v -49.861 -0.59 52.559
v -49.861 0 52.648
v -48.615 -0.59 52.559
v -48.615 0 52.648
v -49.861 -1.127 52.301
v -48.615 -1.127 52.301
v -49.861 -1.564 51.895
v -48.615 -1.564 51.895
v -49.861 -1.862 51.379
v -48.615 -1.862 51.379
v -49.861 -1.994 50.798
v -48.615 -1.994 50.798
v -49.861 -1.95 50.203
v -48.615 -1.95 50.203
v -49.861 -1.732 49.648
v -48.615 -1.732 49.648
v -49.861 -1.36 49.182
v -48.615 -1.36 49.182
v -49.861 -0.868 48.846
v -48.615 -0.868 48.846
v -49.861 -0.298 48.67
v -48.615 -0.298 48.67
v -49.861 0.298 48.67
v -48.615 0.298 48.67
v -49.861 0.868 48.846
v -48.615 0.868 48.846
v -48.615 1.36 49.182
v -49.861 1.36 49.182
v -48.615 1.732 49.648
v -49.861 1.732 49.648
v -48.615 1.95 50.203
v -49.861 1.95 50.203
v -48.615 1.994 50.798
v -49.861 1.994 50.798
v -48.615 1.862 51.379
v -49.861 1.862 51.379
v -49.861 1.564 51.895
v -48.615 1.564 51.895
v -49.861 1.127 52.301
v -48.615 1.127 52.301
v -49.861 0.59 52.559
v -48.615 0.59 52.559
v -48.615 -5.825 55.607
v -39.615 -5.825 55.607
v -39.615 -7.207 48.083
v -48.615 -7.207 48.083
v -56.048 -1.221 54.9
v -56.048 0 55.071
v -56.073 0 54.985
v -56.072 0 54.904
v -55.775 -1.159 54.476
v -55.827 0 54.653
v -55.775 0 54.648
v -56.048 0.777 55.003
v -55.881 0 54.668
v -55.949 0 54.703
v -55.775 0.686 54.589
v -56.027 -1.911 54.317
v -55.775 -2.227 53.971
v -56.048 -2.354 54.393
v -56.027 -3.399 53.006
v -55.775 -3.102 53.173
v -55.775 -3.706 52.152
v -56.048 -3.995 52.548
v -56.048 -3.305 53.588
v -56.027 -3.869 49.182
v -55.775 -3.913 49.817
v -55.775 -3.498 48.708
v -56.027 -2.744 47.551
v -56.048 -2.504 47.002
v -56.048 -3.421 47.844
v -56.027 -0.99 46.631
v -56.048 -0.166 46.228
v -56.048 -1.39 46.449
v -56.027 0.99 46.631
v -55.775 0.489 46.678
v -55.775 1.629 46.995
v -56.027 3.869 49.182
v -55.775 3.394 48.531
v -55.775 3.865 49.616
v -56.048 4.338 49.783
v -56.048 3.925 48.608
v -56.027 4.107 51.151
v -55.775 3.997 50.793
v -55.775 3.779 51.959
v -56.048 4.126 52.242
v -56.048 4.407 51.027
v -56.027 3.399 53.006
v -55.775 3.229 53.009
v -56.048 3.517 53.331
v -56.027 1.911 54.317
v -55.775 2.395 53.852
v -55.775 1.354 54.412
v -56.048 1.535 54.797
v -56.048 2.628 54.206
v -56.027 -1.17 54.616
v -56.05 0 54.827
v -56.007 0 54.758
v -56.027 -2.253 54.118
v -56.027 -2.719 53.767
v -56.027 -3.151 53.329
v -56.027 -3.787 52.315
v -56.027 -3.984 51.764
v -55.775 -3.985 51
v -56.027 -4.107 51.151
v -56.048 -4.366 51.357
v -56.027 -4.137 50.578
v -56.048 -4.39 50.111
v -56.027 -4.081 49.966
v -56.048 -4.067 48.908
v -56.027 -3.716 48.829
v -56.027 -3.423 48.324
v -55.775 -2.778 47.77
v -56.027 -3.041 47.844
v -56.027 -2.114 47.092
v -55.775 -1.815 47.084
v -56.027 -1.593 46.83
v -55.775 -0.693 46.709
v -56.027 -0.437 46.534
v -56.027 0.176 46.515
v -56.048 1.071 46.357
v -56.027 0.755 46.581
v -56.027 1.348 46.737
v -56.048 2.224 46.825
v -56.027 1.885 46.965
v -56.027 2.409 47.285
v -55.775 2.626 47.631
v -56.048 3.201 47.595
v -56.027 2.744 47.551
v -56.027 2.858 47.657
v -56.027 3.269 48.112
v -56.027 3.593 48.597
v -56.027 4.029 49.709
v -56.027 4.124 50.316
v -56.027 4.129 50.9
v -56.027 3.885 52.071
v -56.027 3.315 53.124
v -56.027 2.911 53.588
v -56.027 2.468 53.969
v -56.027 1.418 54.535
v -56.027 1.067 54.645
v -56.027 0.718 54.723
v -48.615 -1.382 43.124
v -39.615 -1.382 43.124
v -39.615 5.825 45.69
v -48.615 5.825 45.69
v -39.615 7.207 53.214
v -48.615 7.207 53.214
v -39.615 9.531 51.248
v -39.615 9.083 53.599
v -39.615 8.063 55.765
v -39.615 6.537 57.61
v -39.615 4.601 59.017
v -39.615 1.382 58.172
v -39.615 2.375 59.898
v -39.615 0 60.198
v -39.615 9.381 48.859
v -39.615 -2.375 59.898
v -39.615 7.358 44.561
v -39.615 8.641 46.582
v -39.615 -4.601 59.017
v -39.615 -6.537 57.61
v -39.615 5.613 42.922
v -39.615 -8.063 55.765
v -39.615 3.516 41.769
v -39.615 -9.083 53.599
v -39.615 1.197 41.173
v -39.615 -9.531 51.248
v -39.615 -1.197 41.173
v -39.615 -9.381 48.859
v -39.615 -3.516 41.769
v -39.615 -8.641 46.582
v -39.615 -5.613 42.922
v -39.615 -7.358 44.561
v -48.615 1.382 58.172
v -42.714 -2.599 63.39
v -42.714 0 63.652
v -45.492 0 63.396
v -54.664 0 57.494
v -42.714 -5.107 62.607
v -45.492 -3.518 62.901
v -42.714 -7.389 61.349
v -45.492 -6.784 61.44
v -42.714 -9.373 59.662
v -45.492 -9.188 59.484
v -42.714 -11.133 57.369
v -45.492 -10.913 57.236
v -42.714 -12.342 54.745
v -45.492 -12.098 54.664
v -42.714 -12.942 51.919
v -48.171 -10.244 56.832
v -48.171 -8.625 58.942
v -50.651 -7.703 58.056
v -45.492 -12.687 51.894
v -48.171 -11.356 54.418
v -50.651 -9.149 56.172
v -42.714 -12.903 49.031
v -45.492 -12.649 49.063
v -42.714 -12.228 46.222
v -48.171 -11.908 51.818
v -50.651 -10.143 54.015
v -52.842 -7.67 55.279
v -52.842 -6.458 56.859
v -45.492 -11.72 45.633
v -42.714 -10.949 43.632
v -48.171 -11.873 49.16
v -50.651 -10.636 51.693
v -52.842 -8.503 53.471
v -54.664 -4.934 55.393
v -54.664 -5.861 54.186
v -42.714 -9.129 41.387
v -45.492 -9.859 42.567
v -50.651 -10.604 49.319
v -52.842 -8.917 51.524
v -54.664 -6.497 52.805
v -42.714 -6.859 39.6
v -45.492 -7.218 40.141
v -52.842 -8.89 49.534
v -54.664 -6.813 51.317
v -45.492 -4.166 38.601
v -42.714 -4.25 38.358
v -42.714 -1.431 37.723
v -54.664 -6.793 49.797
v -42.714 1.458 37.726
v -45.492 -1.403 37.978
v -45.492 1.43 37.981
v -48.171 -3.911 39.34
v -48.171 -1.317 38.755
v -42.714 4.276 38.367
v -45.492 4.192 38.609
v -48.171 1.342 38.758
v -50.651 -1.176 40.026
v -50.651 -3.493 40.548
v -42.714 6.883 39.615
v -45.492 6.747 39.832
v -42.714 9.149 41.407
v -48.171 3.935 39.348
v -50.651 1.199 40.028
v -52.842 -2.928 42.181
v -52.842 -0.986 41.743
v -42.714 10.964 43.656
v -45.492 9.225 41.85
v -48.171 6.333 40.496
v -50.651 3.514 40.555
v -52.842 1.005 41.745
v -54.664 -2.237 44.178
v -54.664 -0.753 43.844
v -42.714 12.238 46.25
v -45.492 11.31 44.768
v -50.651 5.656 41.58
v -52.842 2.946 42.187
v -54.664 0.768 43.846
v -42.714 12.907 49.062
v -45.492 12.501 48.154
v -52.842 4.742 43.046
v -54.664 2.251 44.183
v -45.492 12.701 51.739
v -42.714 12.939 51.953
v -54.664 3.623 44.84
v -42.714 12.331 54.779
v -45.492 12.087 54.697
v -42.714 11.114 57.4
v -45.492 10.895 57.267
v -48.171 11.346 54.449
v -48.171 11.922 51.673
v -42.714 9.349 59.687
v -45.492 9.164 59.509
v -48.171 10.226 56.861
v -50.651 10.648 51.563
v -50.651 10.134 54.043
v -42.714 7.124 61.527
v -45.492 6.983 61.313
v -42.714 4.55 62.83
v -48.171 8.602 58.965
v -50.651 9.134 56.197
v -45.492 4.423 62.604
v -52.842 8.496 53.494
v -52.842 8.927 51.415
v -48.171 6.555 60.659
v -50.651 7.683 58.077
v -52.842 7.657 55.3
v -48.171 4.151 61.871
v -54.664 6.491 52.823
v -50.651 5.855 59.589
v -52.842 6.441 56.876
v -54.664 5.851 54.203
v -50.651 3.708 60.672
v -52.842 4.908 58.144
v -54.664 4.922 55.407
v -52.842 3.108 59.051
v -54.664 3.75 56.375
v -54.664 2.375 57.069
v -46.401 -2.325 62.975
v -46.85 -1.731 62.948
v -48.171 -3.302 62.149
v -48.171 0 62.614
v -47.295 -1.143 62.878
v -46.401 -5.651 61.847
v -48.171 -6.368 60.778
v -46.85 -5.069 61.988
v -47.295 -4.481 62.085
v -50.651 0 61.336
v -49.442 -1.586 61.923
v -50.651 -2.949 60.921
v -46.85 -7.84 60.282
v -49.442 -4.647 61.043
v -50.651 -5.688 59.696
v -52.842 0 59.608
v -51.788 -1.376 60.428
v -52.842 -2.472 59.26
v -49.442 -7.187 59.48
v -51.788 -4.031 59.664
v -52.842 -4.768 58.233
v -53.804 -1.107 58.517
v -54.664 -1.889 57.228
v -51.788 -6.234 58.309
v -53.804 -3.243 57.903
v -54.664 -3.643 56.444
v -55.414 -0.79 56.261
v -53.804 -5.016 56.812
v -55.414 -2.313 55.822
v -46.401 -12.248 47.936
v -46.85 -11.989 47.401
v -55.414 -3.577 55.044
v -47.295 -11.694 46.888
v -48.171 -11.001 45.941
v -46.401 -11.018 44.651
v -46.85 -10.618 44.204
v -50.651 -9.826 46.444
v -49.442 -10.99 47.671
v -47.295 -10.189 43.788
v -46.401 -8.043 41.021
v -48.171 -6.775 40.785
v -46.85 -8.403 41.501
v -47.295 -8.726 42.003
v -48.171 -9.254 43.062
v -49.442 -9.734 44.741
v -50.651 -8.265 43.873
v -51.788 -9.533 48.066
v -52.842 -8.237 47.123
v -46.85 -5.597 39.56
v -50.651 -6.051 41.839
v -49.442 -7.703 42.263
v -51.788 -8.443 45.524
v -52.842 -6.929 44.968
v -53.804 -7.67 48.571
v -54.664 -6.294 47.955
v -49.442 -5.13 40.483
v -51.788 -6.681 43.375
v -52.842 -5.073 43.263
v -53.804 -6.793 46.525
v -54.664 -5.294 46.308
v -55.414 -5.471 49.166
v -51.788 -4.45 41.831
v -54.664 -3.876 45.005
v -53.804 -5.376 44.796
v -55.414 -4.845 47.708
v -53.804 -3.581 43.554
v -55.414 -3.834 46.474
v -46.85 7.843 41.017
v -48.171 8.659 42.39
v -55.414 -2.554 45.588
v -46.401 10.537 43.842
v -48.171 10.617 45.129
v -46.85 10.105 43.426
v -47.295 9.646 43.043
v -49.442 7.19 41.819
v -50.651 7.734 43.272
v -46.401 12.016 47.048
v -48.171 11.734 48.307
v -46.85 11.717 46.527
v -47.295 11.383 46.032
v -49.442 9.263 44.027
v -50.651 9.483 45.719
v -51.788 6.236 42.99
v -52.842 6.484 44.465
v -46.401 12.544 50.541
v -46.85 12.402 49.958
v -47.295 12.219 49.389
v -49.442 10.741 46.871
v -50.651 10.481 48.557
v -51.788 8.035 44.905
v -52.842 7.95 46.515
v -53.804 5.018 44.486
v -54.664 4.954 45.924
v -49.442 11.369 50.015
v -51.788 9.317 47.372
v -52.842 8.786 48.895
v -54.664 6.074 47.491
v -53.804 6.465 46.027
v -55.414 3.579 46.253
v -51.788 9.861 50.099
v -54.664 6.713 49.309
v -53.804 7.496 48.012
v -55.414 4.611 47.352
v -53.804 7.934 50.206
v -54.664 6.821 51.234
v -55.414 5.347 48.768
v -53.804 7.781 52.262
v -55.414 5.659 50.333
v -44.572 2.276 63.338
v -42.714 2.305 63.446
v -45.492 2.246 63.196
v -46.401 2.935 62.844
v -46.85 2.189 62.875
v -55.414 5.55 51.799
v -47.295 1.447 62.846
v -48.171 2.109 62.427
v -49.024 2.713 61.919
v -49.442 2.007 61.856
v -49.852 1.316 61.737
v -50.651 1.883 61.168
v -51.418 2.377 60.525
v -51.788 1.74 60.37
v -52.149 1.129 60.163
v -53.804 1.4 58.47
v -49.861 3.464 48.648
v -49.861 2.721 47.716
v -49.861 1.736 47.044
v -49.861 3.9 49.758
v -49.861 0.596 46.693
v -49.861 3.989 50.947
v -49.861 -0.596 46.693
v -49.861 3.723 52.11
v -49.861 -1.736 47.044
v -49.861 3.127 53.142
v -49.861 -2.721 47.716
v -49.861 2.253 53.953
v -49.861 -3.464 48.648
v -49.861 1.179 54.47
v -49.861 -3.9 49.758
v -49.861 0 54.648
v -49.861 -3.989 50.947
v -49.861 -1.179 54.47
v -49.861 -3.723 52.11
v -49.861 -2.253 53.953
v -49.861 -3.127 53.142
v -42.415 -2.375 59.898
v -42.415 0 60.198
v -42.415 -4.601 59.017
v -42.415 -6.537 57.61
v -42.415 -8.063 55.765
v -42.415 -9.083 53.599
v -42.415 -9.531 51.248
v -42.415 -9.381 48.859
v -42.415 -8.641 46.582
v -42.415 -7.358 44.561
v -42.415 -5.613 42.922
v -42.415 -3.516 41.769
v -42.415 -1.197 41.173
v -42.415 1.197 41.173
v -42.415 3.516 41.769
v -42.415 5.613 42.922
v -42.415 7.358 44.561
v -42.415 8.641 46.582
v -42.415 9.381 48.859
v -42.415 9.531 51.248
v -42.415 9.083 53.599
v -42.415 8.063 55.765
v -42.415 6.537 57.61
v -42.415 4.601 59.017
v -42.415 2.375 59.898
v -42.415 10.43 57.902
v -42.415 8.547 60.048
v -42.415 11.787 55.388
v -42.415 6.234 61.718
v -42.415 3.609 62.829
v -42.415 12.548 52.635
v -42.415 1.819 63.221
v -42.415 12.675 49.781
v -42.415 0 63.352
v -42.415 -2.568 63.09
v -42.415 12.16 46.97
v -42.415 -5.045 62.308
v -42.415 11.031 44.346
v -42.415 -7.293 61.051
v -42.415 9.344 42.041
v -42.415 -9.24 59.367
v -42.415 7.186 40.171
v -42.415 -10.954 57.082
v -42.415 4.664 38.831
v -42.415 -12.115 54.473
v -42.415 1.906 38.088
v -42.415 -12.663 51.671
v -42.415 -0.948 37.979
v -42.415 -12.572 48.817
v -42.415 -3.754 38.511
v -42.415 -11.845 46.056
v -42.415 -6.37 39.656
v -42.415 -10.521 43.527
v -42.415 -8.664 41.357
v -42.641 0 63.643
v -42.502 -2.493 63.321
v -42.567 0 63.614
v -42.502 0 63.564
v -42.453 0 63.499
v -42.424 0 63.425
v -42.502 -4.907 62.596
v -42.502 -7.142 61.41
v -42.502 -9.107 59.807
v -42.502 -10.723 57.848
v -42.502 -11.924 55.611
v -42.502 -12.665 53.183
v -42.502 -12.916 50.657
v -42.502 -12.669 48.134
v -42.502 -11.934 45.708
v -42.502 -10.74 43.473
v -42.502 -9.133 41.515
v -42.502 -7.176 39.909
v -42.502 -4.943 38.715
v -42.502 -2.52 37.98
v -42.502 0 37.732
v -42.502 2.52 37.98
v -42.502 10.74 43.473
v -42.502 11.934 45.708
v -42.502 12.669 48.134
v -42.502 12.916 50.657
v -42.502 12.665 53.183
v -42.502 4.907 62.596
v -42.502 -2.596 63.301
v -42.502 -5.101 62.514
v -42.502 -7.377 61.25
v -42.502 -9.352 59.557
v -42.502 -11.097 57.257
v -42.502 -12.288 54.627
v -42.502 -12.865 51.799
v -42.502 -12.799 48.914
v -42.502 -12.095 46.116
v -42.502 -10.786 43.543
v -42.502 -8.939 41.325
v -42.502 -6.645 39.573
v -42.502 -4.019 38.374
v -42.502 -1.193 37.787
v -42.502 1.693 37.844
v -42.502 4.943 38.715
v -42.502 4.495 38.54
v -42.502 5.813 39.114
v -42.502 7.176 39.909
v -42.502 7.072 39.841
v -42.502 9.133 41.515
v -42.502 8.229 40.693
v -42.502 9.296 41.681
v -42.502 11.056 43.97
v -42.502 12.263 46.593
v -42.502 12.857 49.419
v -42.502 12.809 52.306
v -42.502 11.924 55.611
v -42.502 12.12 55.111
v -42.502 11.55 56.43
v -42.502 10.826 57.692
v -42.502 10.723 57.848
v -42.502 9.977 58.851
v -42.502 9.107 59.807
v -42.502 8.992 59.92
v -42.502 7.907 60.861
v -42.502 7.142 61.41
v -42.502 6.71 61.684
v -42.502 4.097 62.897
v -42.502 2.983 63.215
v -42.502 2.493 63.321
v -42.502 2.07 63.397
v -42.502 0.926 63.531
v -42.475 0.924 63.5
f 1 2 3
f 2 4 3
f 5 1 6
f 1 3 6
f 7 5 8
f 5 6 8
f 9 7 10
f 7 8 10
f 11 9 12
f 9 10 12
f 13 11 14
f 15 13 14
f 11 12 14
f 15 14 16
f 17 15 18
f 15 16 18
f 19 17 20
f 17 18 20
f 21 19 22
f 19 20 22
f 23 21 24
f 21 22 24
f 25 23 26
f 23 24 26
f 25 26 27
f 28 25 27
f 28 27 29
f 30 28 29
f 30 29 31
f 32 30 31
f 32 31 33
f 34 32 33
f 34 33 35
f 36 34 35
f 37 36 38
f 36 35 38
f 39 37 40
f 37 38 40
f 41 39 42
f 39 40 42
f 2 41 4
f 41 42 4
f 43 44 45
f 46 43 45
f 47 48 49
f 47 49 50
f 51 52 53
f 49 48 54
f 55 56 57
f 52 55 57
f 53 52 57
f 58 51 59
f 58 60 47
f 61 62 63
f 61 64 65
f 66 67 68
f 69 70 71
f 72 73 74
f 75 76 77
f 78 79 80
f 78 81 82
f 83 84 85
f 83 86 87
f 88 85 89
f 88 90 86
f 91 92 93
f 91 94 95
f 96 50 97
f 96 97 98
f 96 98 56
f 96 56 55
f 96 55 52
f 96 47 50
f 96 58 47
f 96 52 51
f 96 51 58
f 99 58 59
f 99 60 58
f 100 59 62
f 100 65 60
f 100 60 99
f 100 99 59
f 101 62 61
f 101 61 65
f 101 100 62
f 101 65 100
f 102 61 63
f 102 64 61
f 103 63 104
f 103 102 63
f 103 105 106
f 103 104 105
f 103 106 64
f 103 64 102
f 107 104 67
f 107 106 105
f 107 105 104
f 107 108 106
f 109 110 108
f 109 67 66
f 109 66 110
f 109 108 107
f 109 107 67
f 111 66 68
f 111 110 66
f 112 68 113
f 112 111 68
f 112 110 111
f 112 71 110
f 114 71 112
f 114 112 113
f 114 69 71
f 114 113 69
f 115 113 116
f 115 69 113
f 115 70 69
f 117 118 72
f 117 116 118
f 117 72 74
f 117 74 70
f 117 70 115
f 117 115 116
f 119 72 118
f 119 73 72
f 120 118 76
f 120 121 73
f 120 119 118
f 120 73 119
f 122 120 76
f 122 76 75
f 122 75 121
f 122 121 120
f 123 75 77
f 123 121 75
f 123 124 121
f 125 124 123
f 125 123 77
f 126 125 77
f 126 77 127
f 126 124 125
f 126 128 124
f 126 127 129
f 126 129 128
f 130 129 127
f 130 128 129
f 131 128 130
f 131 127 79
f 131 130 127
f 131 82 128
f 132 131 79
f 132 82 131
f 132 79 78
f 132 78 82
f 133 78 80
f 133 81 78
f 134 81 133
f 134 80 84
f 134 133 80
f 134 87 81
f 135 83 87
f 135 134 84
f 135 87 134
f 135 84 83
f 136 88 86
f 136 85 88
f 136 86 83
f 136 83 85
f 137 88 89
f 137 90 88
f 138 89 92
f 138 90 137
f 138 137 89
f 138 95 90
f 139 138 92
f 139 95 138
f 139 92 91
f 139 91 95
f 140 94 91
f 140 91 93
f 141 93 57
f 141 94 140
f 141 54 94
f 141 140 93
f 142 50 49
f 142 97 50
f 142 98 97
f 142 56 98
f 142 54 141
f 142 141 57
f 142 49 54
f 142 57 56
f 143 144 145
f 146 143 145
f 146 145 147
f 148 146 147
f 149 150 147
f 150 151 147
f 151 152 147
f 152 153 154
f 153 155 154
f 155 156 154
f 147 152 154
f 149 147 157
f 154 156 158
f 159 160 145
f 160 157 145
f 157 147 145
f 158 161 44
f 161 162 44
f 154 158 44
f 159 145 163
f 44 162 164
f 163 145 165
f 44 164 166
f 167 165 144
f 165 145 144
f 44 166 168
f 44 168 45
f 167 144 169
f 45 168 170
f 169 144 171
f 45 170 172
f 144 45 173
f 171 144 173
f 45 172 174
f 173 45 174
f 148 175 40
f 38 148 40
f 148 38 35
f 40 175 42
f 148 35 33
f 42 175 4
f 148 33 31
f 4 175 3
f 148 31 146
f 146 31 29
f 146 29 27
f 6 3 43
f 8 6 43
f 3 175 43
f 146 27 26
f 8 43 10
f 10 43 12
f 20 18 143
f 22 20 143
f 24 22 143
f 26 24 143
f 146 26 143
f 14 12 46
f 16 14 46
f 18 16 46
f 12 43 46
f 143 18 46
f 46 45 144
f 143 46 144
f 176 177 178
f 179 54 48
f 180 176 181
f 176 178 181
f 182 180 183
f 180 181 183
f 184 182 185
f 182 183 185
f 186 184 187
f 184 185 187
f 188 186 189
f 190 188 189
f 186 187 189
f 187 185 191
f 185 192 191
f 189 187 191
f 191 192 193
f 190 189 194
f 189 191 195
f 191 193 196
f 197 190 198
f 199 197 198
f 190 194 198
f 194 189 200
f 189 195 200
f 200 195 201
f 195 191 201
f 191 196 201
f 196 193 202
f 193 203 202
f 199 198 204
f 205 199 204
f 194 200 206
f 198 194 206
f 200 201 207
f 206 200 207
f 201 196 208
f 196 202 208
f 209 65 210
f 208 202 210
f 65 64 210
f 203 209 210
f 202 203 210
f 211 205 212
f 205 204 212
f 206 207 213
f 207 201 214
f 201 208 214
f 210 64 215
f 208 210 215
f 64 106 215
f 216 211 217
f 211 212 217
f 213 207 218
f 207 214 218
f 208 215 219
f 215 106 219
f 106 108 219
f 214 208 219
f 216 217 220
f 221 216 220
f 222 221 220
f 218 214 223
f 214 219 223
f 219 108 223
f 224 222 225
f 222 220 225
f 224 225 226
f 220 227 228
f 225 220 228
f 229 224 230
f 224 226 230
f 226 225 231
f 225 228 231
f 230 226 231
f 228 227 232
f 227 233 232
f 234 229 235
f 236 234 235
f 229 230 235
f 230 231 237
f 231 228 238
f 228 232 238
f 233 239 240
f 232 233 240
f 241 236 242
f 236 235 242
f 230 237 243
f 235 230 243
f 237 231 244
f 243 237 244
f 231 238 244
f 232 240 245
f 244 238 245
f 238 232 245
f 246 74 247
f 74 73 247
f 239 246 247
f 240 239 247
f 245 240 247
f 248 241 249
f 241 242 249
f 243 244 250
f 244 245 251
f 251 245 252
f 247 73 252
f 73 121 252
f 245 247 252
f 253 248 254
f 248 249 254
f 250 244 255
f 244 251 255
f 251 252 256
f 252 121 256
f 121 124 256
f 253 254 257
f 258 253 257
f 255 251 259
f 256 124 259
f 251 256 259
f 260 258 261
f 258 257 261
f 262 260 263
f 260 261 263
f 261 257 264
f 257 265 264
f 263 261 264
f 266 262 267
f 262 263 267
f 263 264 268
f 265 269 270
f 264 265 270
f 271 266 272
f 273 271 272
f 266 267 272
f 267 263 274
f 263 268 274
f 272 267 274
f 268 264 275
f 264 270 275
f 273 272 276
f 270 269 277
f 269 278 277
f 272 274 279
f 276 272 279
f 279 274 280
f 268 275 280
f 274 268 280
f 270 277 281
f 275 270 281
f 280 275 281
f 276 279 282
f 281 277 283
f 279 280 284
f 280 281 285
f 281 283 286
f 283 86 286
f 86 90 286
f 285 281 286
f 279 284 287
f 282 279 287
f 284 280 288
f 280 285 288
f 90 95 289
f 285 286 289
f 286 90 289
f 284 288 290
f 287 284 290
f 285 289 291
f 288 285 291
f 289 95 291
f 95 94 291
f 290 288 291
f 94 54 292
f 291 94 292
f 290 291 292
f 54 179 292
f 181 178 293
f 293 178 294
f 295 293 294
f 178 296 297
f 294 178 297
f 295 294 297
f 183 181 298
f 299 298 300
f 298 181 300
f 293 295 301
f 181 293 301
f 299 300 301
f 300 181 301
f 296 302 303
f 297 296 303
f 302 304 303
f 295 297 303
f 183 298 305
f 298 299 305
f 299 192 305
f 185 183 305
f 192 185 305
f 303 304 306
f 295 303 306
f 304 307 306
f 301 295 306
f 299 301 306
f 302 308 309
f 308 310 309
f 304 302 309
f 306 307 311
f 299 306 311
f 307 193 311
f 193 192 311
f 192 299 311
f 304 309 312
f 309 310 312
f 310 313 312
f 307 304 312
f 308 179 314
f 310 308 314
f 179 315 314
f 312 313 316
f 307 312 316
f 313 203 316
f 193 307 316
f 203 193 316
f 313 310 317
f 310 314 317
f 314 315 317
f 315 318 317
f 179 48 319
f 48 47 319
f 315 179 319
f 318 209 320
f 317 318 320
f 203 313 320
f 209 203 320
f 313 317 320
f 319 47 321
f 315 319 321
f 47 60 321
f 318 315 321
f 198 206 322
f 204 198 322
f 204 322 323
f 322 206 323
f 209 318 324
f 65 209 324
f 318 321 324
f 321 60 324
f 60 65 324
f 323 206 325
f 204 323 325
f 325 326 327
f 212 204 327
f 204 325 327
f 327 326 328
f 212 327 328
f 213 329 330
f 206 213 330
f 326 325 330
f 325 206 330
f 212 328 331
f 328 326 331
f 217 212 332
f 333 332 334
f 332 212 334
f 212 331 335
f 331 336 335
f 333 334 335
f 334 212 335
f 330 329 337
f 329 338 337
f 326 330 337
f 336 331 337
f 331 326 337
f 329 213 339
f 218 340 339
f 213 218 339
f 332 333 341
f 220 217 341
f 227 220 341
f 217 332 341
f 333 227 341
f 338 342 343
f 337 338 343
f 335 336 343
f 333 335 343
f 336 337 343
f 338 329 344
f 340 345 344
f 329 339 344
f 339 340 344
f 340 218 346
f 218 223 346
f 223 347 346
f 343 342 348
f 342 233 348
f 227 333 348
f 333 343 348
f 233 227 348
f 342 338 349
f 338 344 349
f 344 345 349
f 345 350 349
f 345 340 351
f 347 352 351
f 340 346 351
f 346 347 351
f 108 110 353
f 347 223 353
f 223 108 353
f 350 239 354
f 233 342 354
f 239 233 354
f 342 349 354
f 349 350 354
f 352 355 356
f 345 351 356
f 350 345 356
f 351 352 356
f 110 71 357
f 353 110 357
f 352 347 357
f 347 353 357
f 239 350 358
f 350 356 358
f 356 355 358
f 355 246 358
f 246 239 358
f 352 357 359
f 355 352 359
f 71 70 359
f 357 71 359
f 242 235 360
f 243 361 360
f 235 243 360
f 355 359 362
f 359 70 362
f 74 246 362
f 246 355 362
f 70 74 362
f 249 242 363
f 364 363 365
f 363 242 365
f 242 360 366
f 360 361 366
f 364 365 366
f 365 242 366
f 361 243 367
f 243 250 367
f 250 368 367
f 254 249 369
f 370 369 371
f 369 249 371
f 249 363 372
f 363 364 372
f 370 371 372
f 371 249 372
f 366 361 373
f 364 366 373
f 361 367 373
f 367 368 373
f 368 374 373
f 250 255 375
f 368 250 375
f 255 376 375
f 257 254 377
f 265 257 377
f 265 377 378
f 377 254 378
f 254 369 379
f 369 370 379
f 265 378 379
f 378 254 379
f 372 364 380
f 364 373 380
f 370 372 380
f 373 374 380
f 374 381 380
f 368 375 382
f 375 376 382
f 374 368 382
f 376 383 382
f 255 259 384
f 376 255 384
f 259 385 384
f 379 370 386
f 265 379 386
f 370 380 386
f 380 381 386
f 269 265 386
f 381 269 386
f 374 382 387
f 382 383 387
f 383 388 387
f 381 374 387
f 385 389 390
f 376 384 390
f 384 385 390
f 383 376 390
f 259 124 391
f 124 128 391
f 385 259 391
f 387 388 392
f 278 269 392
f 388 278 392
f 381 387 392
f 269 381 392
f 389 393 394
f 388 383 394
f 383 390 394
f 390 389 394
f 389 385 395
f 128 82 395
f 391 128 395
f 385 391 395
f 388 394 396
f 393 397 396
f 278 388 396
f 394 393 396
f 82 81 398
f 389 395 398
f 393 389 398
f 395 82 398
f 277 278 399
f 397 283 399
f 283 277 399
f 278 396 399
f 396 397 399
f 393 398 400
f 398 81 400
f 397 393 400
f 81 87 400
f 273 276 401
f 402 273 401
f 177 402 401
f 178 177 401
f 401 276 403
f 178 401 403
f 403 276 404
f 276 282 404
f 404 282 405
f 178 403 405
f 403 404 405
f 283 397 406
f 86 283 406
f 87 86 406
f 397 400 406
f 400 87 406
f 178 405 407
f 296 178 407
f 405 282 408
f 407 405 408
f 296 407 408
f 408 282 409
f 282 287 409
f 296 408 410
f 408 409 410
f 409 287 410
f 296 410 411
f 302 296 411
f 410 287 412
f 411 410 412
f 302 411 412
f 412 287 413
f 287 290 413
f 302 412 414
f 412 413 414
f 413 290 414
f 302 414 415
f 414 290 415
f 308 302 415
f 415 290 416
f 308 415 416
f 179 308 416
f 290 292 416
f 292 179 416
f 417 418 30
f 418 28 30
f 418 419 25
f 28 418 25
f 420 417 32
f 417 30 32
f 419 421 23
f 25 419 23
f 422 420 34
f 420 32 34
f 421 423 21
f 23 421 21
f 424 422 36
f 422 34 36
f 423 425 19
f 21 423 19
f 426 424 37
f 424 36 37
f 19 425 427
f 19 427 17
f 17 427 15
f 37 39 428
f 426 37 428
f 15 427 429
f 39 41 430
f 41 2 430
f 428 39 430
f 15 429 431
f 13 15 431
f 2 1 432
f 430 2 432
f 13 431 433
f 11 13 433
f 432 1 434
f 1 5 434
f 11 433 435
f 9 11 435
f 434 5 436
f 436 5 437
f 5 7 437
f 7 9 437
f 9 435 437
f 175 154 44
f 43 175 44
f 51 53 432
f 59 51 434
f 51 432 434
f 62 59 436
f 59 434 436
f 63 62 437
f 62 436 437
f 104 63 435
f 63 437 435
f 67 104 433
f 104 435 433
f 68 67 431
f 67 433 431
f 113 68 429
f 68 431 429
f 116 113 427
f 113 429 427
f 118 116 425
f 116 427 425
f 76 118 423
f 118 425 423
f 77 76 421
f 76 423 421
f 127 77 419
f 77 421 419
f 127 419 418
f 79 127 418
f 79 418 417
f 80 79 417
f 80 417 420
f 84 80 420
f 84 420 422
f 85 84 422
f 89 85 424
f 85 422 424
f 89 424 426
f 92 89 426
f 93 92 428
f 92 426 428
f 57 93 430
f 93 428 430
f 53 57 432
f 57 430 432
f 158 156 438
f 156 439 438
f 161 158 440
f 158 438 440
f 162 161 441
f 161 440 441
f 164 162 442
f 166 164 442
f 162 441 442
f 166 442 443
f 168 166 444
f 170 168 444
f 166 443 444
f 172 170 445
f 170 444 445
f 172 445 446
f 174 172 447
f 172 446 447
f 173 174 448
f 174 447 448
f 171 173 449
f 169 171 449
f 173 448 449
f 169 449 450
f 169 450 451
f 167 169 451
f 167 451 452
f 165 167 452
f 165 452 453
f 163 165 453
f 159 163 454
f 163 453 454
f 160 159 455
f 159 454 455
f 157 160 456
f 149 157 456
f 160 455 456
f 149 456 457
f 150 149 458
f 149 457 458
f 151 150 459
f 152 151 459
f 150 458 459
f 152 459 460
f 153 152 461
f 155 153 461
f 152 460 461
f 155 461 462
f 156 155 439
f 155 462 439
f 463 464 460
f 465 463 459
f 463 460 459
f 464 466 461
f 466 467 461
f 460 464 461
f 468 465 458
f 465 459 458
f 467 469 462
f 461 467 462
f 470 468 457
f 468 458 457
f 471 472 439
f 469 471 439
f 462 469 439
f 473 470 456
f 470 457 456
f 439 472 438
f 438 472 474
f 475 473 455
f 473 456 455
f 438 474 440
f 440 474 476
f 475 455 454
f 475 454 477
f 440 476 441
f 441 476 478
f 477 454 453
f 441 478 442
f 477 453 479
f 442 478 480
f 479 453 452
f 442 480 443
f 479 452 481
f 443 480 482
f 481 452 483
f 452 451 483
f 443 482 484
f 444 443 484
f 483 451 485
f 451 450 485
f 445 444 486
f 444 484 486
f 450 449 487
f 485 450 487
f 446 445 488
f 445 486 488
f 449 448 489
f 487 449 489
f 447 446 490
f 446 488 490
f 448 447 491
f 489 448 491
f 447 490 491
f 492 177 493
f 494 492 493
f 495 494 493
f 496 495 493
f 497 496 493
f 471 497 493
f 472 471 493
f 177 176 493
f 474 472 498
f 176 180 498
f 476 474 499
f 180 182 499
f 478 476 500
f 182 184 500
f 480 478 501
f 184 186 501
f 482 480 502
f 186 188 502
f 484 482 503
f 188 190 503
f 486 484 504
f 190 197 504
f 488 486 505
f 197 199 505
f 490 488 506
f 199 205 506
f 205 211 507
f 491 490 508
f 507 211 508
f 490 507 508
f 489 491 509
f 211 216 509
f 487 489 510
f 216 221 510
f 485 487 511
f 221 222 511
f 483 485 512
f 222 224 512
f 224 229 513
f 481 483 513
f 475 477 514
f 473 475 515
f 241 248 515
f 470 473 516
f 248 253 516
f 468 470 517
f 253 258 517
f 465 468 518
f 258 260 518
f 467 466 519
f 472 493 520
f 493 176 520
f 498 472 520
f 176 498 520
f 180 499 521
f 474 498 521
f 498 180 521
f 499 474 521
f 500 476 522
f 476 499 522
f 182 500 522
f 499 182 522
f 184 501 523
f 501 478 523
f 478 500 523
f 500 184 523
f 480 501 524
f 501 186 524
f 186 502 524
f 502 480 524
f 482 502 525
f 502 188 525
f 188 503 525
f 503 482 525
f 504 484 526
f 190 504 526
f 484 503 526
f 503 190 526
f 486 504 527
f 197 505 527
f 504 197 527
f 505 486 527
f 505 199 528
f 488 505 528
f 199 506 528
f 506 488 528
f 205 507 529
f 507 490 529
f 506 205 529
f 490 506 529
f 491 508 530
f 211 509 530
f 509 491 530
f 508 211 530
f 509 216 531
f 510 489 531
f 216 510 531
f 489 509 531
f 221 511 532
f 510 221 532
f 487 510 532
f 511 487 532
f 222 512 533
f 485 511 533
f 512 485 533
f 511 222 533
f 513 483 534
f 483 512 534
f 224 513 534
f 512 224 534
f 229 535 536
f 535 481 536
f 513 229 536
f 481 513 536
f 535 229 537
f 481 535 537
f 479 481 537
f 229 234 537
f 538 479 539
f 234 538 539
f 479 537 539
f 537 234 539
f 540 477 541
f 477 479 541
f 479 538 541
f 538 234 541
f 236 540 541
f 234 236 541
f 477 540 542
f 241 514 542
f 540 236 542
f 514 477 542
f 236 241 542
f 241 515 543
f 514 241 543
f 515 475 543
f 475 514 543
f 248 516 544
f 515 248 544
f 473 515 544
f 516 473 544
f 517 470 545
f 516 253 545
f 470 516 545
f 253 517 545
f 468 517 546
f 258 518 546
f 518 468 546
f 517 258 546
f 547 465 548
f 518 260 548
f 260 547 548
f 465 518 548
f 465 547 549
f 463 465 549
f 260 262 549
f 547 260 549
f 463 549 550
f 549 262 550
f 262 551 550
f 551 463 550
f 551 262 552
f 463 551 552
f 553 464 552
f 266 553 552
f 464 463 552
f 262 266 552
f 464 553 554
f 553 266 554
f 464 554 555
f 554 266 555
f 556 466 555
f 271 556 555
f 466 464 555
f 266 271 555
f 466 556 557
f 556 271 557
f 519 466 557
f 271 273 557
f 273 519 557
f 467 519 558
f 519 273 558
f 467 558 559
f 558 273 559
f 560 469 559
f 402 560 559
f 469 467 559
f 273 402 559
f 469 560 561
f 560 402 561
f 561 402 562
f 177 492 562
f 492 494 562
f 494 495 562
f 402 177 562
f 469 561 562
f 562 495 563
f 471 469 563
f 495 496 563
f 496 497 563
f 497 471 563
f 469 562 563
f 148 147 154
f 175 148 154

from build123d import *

# Parameters (mm, degrees)
F2_R     = 3.65
F3_DEPTH = 9
F4_R     = 0.3


with BuildPart() as f1:
    # F0 (on Front) → F1 (revolve)
    with BuildSketch(Plane.XZ):
        with BuildLine():
            ThreePointArc((-42.4148629687, 63.6481613441), (-50.7192303521, 61.2915541367), (-56.2311671597, 54.6481613441))
            Line((-56.2311671597, 54.6481613441), (-49.8611671597, 54.6481613441))
            Line((-49.8611671597, 54.6481613441), (-49.8611671597, 52.6481613441))
            Line((-49.8611671597, 52.6481613441), (-48.6148629687, 52.6481613441))
            Line((-48.6148629687, 52.6481613441), (-48.6148629687, 54.2981613441))
            Line((-48.6148629687, 54.2981613441), (-39.6148629687, 54.2981613441))
            Line((-39.6148629687, 54.2981613441), (-39.6148629687, 60.1981613441))
            Line((-39.6148629687, 60.1981613441), (-42.4148629687, 60.1981613441))
            Line((-42.4148629687, 60.1981613441), (-42.4148629687, 63.6481613441))
        make_face()
    revolve(axis=Axis((-46.1157262325, 0, 50.6481613441), (1, 0, 0)))

    # F2 (on face) → F3 (cut)
    with BuildSketch(Plane.YZ.offset(-39.6148629687)):
        Polygon((5.8253410005, 45.6895423602), (7.206960508, 53.2137451444), (1.3816195075, 58.1723641283), (-5.8253410005, 55.606780328), (-7.206960508, 48.0825775439), (-1.3816195075, 43.12395856), align=None)
        with Locations((0, 50.6481613441)):
            Circle(F2_R, mode=Mode.SUBTRACT)
    extrude(amount=-F3_DEPTH, mode=Mode.SUBTRACT)

    # F4
    f4_edges = [f1.edges().sort_by_distance(p)[0] for p in [
        (-56.231167, 0, 46.648161),
        (-42.414863, 0, 37.648161),
        (-50.71923, 0, 61.291554),
    ]]
    fillet(f4_edges, radius=F4_R)


solid = f1.part
